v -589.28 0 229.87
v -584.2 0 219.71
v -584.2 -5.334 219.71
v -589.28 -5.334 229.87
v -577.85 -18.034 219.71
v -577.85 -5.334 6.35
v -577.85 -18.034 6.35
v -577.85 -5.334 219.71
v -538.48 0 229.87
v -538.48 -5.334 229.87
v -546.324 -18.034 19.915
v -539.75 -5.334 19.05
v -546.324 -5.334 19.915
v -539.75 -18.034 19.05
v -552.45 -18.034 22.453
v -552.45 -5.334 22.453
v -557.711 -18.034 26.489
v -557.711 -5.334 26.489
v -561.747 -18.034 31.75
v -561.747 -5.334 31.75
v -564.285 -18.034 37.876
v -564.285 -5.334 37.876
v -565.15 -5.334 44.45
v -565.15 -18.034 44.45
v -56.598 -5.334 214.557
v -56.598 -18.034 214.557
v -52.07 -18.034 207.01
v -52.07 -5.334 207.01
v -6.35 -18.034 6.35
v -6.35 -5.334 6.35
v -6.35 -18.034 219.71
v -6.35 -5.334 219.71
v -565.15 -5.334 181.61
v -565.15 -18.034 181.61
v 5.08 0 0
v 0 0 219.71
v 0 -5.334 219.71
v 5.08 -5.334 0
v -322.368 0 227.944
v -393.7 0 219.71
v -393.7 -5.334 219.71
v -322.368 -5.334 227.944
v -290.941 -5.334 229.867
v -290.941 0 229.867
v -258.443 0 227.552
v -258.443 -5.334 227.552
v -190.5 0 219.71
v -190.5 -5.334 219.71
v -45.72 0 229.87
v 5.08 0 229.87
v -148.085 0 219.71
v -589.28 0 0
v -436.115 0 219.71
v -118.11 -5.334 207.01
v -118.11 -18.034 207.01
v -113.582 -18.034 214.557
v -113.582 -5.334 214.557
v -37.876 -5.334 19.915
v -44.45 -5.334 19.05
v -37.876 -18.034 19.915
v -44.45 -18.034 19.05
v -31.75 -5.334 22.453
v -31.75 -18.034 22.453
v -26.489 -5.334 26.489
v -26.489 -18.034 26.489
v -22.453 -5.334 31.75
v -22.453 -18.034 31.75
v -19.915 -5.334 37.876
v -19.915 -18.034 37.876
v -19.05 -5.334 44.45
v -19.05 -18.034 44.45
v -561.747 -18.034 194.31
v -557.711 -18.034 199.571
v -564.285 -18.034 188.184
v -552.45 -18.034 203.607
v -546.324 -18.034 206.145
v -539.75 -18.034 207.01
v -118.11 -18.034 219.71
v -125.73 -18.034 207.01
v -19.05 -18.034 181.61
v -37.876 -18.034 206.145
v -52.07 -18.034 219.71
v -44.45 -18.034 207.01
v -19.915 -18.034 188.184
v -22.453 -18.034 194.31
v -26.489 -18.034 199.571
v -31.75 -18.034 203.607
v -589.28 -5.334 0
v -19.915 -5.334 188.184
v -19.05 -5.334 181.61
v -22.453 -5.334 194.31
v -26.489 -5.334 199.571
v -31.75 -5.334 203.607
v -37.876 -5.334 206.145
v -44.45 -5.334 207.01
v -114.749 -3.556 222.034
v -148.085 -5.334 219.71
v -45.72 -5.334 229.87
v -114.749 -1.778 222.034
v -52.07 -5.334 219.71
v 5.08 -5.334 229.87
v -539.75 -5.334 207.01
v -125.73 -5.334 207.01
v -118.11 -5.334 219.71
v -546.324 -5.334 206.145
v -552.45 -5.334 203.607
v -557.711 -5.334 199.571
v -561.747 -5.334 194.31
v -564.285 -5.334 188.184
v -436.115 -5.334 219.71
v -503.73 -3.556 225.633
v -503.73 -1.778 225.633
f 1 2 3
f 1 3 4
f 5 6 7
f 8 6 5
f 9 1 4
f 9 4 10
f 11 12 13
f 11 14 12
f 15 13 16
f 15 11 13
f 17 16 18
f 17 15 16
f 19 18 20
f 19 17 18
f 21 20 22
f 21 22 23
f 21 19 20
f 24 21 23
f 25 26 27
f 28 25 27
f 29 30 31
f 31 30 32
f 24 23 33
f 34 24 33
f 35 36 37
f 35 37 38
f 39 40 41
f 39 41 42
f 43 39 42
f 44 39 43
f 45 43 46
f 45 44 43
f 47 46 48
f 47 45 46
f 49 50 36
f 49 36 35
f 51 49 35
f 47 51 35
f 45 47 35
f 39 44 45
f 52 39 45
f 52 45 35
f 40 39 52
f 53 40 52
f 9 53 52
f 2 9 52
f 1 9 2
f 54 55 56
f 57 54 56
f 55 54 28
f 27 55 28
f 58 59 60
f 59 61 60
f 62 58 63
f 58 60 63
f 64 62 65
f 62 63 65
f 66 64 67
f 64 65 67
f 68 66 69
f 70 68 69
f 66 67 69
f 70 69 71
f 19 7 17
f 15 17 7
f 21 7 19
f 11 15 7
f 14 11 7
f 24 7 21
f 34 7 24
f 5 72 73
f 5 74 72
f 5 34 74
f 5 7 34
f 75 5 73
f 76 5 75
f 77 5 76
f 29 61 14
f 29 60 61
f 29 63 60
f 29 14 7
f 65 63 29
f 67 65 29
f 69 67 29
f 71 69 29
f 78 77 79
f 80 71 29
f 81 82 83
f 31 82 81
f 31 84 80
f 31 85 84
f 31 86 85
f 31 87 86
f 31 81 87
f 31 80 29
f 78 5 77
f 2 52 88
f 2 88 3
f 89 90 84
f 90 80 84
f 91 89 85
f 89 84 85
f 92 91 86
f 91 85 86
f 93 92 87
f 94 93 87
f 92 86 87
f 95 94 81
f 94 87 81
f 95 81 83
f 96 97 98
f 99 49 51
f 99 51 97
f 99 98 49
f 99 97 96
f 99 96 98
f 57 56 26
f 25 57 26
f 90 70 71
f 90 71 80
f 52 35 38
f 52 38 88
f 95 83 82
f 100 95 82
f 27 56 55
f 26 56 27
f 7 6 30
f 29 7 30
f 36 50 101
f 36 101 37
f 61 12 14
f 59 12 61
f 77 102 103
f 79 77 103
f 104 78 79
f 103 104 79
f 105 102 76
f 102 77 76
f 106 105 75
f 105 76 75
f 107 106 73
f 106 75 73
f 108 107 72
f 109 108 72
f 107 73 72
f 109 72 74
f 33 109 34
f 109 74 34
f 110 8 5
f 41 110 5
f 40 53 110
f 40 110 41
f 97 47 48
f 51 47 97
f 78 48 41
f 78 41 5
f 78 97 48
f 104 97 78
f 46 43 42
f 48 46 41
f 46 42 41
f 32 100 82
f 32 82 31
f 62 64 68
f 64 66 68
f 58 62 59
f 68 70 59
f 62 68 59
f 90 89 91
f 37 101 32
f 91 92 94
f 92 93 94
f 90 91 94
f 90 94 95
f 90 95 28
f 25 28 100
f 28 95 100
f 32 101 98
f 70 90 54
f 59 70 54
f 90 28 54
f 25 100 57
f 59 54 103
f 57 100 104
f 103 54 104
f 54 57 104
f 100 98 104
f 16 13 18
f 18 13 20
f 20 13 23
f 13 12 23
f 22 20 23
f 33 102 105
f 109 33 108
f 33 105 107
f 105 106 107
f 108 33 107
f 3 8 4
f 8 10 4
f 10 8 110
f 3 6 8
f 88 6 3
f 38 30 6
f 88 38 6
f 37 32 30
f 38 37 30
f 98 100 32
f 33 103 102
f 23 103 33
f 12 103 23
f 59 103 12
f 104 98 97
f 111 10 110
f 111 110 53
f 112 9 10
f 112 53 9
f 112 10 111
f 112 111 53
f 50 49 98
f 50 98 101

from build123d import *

# Parameters (mm, degrees)
F0_W     = 584.2
F0_H     = 219.71
F1_DEPTH = 5.334
F2_W     = 571.5
F2_H     = 213.36
F2_W_2   = 546.1
F2_H_2   = 187.96
F3_DEPTH = 12.7
F4_R     = 25.4
F6_DEPTH = 12.7
F8_DEPTH = 5.334


# Not quite as in the source:
# - a feature names something its author has since deleted; it is built from what else it names


with BuildPart() as f1:
    # F0 (on Front) → F1 (new body)
    with BuildSketch(Plane.XZ):
        with Locations((-292.1, 109.855)):
            Rectangle(F0_W, F0_H)
    extrude(amount=F1_DEPTH)

    # F2 (on face) → F3 (join)
    with BuildSketch(Plane.XZ.offset(5.334)):
        with Locations((-292.1, 113.03)):
            Rectangle(F2_W, F2_H)
        with Locations((-292.1, 113.03)):
            Rectangle(F2_W_2, F2_H_2, mode=Mode.SUBTRACT)
    extrude(amount=F3_DEPTH)

    # F4
    f4_edges = [f1.edges().sort_by_distance(p)[0] for p in [
        (-565.15, -11.684, 207.01),
        (-19.05, -11.684, 207.01),
        (-19.05, -11.684, 19.05),
        (-565.15, -11.684, 19.05),
    ]]
    fillet(f4_edges, radius=F4_R)

    # F5 (on face) → F6 (cut)
    with BuildSketch(Plane.XZ.offset(18.034)):
        Polygon((-118.11, 219.71), (-125.73, 207.01), (-118.11, 207.01), (-113.5820166854, 214.5566388576), (-110.49, 219.71), align=None)
        Polygon((-56.5979833146, 214.5566388576), (-52.07, 207.01), (-44.45, 207.01), (-52.07, 219.71), (-59.69, 219.71), align=None)
        Polygon((-59.69, 219.71), (-110.49, 219.71), (-113.5820166854, 214.5566388576), (-56.5979833146, 214.5566388576), align=None)
    extrude(amount=-F6_DEPTH, mode=Mode.SUBTRACT)

    # F7 (on face) → F8 (join)
    with BuildSketch(Plane(origin=(0, 0, 0), x_dir=(-1, 0, 0), z_dir=(0, 1, 0))):
        Polygon((-5.08, 0), (0, 0), (0, 219.71), align=None)
        Polygon((584.2, 219.71), (584.2, 0), (589.28, 0), align=None)
        with BuildLine():
            Line((-5.08, 229.87), (0, 219.71))
            Line((0, 219.71), (148.0852009026, 219.71))
            add(Edge.make_bspline(
                [(148.0852009026, 219.71), (115.3779899576, 221.1840971885), (80.5489949788, 225.5270485943), (45.72, 229.87)],
                knots=[0.812101374, 0.812101374, 0.812101374, 0.812101374, 1, 1, 1, 1], degree=3))
            Line((45.72, 229.87), (-5.08, 229.87))
        make_face()
        with BuildLine():
            Line((436.1147990974, 219.71), (584.2, 219.71))
            Line((584.2, 219.71), (589.28, 229.87))
            Line((589.28, 229.87), (538.48, 229.87))
            add(Edge.make_bspline(
                [(538.48, 229.87), (503.6510050212, 225.5270485943), (468.8220100424, 221.1840971885), (436.1147990974, 219.71)],
                knots=[0, 0, 0, 0, 0.187898626, 0.187898626, 0.187898626, 0.187898626], degree=3))
        make_face()
        with BuildLine():
            add(Edge.make_bspline(
                [(292.1, 229.87), (259.7414000619, 229.87), (227.3828001238, 221.731425099), (190.5, 219.71)],
                knots=[0.5, 0.5, 0.5, 0.5, 0.7280781407, 0.7280781407, 0.7280781407, 0.7280781407], degree=3))
            Line((190.5, 219.71), (393.7, 219.71))
            add(Edge.make_bspline(
                [(393.7, 219.71), (356.8171998762, 221.731425099), (324.4585999381, 229.87), (292.1, 229.87)],
                knots=[0.2719218593, 0.2719218593, 0.2719218593, 0.2719218593, 0.5, 0.5, 0.5, 0.5], degree=3))
        make_face()
    extrude(amount=-F8_DEPTH)


solid = f1.part
